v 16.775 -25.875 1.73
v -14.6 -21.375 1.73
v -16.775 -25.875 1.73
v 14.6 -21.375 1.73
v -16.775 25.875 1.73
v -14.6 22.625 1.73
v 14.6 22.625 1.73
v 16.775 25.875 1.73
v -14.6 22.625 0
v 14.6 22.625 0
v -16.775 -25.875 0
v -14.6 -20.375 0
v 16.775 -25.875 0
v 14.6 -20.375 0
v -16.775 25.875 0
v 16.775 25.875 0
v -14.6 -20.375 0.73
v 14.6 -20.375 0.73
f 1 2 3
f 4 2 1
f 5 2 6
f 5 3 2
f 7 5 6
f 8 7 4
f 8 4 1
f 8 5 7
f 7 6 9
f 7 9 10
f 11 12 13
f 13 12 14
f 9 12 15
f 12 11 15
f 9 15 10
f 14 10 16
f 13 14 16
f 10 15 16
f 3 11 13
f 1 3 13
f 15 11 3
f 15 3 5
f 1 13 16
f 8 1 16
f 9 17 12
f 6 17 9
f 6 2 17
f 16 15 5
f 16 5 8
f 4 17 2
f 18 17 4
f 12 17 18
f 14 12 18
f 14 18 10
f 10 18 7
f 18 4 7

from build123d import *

# Parameters (mm, degrees)
SKETCH_W     = 33.55
SKETCH_H     = 51.75
PAD_DEPTH    = 1.73
SKETCH001_W  = 29.2
SKETCH001_H  = 43
POCKET_DEPTH = 5
CHAMFER_SIZE = 1


with BuildPart() as part:
    # Sketch → Pad (new body)
    with BuildSketch(Plane.XY):
        Rectangle(SKETCH_W, SKETCH_H)
    extrude(amount=PAD_DEPTH)

    # Sketch001 (on Face6 of Pad) → Pocket (cut)
    with BuildSketch(Plane.XY.offset(1.73)):
        with Locations((0, 1.125)):
            Rectangle(SKETCH001_W, SKETCH001_H)
    extrude(amount=-POCKET_DEPTH, mode=Mode.SUBTRACT)

    # Chamfer
    chamfer_edges = [part.edges().sort_by_distance(p)[0] for p in [
        (0, -20.375, 1.73),
    ]]
    chamfer(chamfer_edges, length=CHAMFER_SIZE)


solid = part.part
